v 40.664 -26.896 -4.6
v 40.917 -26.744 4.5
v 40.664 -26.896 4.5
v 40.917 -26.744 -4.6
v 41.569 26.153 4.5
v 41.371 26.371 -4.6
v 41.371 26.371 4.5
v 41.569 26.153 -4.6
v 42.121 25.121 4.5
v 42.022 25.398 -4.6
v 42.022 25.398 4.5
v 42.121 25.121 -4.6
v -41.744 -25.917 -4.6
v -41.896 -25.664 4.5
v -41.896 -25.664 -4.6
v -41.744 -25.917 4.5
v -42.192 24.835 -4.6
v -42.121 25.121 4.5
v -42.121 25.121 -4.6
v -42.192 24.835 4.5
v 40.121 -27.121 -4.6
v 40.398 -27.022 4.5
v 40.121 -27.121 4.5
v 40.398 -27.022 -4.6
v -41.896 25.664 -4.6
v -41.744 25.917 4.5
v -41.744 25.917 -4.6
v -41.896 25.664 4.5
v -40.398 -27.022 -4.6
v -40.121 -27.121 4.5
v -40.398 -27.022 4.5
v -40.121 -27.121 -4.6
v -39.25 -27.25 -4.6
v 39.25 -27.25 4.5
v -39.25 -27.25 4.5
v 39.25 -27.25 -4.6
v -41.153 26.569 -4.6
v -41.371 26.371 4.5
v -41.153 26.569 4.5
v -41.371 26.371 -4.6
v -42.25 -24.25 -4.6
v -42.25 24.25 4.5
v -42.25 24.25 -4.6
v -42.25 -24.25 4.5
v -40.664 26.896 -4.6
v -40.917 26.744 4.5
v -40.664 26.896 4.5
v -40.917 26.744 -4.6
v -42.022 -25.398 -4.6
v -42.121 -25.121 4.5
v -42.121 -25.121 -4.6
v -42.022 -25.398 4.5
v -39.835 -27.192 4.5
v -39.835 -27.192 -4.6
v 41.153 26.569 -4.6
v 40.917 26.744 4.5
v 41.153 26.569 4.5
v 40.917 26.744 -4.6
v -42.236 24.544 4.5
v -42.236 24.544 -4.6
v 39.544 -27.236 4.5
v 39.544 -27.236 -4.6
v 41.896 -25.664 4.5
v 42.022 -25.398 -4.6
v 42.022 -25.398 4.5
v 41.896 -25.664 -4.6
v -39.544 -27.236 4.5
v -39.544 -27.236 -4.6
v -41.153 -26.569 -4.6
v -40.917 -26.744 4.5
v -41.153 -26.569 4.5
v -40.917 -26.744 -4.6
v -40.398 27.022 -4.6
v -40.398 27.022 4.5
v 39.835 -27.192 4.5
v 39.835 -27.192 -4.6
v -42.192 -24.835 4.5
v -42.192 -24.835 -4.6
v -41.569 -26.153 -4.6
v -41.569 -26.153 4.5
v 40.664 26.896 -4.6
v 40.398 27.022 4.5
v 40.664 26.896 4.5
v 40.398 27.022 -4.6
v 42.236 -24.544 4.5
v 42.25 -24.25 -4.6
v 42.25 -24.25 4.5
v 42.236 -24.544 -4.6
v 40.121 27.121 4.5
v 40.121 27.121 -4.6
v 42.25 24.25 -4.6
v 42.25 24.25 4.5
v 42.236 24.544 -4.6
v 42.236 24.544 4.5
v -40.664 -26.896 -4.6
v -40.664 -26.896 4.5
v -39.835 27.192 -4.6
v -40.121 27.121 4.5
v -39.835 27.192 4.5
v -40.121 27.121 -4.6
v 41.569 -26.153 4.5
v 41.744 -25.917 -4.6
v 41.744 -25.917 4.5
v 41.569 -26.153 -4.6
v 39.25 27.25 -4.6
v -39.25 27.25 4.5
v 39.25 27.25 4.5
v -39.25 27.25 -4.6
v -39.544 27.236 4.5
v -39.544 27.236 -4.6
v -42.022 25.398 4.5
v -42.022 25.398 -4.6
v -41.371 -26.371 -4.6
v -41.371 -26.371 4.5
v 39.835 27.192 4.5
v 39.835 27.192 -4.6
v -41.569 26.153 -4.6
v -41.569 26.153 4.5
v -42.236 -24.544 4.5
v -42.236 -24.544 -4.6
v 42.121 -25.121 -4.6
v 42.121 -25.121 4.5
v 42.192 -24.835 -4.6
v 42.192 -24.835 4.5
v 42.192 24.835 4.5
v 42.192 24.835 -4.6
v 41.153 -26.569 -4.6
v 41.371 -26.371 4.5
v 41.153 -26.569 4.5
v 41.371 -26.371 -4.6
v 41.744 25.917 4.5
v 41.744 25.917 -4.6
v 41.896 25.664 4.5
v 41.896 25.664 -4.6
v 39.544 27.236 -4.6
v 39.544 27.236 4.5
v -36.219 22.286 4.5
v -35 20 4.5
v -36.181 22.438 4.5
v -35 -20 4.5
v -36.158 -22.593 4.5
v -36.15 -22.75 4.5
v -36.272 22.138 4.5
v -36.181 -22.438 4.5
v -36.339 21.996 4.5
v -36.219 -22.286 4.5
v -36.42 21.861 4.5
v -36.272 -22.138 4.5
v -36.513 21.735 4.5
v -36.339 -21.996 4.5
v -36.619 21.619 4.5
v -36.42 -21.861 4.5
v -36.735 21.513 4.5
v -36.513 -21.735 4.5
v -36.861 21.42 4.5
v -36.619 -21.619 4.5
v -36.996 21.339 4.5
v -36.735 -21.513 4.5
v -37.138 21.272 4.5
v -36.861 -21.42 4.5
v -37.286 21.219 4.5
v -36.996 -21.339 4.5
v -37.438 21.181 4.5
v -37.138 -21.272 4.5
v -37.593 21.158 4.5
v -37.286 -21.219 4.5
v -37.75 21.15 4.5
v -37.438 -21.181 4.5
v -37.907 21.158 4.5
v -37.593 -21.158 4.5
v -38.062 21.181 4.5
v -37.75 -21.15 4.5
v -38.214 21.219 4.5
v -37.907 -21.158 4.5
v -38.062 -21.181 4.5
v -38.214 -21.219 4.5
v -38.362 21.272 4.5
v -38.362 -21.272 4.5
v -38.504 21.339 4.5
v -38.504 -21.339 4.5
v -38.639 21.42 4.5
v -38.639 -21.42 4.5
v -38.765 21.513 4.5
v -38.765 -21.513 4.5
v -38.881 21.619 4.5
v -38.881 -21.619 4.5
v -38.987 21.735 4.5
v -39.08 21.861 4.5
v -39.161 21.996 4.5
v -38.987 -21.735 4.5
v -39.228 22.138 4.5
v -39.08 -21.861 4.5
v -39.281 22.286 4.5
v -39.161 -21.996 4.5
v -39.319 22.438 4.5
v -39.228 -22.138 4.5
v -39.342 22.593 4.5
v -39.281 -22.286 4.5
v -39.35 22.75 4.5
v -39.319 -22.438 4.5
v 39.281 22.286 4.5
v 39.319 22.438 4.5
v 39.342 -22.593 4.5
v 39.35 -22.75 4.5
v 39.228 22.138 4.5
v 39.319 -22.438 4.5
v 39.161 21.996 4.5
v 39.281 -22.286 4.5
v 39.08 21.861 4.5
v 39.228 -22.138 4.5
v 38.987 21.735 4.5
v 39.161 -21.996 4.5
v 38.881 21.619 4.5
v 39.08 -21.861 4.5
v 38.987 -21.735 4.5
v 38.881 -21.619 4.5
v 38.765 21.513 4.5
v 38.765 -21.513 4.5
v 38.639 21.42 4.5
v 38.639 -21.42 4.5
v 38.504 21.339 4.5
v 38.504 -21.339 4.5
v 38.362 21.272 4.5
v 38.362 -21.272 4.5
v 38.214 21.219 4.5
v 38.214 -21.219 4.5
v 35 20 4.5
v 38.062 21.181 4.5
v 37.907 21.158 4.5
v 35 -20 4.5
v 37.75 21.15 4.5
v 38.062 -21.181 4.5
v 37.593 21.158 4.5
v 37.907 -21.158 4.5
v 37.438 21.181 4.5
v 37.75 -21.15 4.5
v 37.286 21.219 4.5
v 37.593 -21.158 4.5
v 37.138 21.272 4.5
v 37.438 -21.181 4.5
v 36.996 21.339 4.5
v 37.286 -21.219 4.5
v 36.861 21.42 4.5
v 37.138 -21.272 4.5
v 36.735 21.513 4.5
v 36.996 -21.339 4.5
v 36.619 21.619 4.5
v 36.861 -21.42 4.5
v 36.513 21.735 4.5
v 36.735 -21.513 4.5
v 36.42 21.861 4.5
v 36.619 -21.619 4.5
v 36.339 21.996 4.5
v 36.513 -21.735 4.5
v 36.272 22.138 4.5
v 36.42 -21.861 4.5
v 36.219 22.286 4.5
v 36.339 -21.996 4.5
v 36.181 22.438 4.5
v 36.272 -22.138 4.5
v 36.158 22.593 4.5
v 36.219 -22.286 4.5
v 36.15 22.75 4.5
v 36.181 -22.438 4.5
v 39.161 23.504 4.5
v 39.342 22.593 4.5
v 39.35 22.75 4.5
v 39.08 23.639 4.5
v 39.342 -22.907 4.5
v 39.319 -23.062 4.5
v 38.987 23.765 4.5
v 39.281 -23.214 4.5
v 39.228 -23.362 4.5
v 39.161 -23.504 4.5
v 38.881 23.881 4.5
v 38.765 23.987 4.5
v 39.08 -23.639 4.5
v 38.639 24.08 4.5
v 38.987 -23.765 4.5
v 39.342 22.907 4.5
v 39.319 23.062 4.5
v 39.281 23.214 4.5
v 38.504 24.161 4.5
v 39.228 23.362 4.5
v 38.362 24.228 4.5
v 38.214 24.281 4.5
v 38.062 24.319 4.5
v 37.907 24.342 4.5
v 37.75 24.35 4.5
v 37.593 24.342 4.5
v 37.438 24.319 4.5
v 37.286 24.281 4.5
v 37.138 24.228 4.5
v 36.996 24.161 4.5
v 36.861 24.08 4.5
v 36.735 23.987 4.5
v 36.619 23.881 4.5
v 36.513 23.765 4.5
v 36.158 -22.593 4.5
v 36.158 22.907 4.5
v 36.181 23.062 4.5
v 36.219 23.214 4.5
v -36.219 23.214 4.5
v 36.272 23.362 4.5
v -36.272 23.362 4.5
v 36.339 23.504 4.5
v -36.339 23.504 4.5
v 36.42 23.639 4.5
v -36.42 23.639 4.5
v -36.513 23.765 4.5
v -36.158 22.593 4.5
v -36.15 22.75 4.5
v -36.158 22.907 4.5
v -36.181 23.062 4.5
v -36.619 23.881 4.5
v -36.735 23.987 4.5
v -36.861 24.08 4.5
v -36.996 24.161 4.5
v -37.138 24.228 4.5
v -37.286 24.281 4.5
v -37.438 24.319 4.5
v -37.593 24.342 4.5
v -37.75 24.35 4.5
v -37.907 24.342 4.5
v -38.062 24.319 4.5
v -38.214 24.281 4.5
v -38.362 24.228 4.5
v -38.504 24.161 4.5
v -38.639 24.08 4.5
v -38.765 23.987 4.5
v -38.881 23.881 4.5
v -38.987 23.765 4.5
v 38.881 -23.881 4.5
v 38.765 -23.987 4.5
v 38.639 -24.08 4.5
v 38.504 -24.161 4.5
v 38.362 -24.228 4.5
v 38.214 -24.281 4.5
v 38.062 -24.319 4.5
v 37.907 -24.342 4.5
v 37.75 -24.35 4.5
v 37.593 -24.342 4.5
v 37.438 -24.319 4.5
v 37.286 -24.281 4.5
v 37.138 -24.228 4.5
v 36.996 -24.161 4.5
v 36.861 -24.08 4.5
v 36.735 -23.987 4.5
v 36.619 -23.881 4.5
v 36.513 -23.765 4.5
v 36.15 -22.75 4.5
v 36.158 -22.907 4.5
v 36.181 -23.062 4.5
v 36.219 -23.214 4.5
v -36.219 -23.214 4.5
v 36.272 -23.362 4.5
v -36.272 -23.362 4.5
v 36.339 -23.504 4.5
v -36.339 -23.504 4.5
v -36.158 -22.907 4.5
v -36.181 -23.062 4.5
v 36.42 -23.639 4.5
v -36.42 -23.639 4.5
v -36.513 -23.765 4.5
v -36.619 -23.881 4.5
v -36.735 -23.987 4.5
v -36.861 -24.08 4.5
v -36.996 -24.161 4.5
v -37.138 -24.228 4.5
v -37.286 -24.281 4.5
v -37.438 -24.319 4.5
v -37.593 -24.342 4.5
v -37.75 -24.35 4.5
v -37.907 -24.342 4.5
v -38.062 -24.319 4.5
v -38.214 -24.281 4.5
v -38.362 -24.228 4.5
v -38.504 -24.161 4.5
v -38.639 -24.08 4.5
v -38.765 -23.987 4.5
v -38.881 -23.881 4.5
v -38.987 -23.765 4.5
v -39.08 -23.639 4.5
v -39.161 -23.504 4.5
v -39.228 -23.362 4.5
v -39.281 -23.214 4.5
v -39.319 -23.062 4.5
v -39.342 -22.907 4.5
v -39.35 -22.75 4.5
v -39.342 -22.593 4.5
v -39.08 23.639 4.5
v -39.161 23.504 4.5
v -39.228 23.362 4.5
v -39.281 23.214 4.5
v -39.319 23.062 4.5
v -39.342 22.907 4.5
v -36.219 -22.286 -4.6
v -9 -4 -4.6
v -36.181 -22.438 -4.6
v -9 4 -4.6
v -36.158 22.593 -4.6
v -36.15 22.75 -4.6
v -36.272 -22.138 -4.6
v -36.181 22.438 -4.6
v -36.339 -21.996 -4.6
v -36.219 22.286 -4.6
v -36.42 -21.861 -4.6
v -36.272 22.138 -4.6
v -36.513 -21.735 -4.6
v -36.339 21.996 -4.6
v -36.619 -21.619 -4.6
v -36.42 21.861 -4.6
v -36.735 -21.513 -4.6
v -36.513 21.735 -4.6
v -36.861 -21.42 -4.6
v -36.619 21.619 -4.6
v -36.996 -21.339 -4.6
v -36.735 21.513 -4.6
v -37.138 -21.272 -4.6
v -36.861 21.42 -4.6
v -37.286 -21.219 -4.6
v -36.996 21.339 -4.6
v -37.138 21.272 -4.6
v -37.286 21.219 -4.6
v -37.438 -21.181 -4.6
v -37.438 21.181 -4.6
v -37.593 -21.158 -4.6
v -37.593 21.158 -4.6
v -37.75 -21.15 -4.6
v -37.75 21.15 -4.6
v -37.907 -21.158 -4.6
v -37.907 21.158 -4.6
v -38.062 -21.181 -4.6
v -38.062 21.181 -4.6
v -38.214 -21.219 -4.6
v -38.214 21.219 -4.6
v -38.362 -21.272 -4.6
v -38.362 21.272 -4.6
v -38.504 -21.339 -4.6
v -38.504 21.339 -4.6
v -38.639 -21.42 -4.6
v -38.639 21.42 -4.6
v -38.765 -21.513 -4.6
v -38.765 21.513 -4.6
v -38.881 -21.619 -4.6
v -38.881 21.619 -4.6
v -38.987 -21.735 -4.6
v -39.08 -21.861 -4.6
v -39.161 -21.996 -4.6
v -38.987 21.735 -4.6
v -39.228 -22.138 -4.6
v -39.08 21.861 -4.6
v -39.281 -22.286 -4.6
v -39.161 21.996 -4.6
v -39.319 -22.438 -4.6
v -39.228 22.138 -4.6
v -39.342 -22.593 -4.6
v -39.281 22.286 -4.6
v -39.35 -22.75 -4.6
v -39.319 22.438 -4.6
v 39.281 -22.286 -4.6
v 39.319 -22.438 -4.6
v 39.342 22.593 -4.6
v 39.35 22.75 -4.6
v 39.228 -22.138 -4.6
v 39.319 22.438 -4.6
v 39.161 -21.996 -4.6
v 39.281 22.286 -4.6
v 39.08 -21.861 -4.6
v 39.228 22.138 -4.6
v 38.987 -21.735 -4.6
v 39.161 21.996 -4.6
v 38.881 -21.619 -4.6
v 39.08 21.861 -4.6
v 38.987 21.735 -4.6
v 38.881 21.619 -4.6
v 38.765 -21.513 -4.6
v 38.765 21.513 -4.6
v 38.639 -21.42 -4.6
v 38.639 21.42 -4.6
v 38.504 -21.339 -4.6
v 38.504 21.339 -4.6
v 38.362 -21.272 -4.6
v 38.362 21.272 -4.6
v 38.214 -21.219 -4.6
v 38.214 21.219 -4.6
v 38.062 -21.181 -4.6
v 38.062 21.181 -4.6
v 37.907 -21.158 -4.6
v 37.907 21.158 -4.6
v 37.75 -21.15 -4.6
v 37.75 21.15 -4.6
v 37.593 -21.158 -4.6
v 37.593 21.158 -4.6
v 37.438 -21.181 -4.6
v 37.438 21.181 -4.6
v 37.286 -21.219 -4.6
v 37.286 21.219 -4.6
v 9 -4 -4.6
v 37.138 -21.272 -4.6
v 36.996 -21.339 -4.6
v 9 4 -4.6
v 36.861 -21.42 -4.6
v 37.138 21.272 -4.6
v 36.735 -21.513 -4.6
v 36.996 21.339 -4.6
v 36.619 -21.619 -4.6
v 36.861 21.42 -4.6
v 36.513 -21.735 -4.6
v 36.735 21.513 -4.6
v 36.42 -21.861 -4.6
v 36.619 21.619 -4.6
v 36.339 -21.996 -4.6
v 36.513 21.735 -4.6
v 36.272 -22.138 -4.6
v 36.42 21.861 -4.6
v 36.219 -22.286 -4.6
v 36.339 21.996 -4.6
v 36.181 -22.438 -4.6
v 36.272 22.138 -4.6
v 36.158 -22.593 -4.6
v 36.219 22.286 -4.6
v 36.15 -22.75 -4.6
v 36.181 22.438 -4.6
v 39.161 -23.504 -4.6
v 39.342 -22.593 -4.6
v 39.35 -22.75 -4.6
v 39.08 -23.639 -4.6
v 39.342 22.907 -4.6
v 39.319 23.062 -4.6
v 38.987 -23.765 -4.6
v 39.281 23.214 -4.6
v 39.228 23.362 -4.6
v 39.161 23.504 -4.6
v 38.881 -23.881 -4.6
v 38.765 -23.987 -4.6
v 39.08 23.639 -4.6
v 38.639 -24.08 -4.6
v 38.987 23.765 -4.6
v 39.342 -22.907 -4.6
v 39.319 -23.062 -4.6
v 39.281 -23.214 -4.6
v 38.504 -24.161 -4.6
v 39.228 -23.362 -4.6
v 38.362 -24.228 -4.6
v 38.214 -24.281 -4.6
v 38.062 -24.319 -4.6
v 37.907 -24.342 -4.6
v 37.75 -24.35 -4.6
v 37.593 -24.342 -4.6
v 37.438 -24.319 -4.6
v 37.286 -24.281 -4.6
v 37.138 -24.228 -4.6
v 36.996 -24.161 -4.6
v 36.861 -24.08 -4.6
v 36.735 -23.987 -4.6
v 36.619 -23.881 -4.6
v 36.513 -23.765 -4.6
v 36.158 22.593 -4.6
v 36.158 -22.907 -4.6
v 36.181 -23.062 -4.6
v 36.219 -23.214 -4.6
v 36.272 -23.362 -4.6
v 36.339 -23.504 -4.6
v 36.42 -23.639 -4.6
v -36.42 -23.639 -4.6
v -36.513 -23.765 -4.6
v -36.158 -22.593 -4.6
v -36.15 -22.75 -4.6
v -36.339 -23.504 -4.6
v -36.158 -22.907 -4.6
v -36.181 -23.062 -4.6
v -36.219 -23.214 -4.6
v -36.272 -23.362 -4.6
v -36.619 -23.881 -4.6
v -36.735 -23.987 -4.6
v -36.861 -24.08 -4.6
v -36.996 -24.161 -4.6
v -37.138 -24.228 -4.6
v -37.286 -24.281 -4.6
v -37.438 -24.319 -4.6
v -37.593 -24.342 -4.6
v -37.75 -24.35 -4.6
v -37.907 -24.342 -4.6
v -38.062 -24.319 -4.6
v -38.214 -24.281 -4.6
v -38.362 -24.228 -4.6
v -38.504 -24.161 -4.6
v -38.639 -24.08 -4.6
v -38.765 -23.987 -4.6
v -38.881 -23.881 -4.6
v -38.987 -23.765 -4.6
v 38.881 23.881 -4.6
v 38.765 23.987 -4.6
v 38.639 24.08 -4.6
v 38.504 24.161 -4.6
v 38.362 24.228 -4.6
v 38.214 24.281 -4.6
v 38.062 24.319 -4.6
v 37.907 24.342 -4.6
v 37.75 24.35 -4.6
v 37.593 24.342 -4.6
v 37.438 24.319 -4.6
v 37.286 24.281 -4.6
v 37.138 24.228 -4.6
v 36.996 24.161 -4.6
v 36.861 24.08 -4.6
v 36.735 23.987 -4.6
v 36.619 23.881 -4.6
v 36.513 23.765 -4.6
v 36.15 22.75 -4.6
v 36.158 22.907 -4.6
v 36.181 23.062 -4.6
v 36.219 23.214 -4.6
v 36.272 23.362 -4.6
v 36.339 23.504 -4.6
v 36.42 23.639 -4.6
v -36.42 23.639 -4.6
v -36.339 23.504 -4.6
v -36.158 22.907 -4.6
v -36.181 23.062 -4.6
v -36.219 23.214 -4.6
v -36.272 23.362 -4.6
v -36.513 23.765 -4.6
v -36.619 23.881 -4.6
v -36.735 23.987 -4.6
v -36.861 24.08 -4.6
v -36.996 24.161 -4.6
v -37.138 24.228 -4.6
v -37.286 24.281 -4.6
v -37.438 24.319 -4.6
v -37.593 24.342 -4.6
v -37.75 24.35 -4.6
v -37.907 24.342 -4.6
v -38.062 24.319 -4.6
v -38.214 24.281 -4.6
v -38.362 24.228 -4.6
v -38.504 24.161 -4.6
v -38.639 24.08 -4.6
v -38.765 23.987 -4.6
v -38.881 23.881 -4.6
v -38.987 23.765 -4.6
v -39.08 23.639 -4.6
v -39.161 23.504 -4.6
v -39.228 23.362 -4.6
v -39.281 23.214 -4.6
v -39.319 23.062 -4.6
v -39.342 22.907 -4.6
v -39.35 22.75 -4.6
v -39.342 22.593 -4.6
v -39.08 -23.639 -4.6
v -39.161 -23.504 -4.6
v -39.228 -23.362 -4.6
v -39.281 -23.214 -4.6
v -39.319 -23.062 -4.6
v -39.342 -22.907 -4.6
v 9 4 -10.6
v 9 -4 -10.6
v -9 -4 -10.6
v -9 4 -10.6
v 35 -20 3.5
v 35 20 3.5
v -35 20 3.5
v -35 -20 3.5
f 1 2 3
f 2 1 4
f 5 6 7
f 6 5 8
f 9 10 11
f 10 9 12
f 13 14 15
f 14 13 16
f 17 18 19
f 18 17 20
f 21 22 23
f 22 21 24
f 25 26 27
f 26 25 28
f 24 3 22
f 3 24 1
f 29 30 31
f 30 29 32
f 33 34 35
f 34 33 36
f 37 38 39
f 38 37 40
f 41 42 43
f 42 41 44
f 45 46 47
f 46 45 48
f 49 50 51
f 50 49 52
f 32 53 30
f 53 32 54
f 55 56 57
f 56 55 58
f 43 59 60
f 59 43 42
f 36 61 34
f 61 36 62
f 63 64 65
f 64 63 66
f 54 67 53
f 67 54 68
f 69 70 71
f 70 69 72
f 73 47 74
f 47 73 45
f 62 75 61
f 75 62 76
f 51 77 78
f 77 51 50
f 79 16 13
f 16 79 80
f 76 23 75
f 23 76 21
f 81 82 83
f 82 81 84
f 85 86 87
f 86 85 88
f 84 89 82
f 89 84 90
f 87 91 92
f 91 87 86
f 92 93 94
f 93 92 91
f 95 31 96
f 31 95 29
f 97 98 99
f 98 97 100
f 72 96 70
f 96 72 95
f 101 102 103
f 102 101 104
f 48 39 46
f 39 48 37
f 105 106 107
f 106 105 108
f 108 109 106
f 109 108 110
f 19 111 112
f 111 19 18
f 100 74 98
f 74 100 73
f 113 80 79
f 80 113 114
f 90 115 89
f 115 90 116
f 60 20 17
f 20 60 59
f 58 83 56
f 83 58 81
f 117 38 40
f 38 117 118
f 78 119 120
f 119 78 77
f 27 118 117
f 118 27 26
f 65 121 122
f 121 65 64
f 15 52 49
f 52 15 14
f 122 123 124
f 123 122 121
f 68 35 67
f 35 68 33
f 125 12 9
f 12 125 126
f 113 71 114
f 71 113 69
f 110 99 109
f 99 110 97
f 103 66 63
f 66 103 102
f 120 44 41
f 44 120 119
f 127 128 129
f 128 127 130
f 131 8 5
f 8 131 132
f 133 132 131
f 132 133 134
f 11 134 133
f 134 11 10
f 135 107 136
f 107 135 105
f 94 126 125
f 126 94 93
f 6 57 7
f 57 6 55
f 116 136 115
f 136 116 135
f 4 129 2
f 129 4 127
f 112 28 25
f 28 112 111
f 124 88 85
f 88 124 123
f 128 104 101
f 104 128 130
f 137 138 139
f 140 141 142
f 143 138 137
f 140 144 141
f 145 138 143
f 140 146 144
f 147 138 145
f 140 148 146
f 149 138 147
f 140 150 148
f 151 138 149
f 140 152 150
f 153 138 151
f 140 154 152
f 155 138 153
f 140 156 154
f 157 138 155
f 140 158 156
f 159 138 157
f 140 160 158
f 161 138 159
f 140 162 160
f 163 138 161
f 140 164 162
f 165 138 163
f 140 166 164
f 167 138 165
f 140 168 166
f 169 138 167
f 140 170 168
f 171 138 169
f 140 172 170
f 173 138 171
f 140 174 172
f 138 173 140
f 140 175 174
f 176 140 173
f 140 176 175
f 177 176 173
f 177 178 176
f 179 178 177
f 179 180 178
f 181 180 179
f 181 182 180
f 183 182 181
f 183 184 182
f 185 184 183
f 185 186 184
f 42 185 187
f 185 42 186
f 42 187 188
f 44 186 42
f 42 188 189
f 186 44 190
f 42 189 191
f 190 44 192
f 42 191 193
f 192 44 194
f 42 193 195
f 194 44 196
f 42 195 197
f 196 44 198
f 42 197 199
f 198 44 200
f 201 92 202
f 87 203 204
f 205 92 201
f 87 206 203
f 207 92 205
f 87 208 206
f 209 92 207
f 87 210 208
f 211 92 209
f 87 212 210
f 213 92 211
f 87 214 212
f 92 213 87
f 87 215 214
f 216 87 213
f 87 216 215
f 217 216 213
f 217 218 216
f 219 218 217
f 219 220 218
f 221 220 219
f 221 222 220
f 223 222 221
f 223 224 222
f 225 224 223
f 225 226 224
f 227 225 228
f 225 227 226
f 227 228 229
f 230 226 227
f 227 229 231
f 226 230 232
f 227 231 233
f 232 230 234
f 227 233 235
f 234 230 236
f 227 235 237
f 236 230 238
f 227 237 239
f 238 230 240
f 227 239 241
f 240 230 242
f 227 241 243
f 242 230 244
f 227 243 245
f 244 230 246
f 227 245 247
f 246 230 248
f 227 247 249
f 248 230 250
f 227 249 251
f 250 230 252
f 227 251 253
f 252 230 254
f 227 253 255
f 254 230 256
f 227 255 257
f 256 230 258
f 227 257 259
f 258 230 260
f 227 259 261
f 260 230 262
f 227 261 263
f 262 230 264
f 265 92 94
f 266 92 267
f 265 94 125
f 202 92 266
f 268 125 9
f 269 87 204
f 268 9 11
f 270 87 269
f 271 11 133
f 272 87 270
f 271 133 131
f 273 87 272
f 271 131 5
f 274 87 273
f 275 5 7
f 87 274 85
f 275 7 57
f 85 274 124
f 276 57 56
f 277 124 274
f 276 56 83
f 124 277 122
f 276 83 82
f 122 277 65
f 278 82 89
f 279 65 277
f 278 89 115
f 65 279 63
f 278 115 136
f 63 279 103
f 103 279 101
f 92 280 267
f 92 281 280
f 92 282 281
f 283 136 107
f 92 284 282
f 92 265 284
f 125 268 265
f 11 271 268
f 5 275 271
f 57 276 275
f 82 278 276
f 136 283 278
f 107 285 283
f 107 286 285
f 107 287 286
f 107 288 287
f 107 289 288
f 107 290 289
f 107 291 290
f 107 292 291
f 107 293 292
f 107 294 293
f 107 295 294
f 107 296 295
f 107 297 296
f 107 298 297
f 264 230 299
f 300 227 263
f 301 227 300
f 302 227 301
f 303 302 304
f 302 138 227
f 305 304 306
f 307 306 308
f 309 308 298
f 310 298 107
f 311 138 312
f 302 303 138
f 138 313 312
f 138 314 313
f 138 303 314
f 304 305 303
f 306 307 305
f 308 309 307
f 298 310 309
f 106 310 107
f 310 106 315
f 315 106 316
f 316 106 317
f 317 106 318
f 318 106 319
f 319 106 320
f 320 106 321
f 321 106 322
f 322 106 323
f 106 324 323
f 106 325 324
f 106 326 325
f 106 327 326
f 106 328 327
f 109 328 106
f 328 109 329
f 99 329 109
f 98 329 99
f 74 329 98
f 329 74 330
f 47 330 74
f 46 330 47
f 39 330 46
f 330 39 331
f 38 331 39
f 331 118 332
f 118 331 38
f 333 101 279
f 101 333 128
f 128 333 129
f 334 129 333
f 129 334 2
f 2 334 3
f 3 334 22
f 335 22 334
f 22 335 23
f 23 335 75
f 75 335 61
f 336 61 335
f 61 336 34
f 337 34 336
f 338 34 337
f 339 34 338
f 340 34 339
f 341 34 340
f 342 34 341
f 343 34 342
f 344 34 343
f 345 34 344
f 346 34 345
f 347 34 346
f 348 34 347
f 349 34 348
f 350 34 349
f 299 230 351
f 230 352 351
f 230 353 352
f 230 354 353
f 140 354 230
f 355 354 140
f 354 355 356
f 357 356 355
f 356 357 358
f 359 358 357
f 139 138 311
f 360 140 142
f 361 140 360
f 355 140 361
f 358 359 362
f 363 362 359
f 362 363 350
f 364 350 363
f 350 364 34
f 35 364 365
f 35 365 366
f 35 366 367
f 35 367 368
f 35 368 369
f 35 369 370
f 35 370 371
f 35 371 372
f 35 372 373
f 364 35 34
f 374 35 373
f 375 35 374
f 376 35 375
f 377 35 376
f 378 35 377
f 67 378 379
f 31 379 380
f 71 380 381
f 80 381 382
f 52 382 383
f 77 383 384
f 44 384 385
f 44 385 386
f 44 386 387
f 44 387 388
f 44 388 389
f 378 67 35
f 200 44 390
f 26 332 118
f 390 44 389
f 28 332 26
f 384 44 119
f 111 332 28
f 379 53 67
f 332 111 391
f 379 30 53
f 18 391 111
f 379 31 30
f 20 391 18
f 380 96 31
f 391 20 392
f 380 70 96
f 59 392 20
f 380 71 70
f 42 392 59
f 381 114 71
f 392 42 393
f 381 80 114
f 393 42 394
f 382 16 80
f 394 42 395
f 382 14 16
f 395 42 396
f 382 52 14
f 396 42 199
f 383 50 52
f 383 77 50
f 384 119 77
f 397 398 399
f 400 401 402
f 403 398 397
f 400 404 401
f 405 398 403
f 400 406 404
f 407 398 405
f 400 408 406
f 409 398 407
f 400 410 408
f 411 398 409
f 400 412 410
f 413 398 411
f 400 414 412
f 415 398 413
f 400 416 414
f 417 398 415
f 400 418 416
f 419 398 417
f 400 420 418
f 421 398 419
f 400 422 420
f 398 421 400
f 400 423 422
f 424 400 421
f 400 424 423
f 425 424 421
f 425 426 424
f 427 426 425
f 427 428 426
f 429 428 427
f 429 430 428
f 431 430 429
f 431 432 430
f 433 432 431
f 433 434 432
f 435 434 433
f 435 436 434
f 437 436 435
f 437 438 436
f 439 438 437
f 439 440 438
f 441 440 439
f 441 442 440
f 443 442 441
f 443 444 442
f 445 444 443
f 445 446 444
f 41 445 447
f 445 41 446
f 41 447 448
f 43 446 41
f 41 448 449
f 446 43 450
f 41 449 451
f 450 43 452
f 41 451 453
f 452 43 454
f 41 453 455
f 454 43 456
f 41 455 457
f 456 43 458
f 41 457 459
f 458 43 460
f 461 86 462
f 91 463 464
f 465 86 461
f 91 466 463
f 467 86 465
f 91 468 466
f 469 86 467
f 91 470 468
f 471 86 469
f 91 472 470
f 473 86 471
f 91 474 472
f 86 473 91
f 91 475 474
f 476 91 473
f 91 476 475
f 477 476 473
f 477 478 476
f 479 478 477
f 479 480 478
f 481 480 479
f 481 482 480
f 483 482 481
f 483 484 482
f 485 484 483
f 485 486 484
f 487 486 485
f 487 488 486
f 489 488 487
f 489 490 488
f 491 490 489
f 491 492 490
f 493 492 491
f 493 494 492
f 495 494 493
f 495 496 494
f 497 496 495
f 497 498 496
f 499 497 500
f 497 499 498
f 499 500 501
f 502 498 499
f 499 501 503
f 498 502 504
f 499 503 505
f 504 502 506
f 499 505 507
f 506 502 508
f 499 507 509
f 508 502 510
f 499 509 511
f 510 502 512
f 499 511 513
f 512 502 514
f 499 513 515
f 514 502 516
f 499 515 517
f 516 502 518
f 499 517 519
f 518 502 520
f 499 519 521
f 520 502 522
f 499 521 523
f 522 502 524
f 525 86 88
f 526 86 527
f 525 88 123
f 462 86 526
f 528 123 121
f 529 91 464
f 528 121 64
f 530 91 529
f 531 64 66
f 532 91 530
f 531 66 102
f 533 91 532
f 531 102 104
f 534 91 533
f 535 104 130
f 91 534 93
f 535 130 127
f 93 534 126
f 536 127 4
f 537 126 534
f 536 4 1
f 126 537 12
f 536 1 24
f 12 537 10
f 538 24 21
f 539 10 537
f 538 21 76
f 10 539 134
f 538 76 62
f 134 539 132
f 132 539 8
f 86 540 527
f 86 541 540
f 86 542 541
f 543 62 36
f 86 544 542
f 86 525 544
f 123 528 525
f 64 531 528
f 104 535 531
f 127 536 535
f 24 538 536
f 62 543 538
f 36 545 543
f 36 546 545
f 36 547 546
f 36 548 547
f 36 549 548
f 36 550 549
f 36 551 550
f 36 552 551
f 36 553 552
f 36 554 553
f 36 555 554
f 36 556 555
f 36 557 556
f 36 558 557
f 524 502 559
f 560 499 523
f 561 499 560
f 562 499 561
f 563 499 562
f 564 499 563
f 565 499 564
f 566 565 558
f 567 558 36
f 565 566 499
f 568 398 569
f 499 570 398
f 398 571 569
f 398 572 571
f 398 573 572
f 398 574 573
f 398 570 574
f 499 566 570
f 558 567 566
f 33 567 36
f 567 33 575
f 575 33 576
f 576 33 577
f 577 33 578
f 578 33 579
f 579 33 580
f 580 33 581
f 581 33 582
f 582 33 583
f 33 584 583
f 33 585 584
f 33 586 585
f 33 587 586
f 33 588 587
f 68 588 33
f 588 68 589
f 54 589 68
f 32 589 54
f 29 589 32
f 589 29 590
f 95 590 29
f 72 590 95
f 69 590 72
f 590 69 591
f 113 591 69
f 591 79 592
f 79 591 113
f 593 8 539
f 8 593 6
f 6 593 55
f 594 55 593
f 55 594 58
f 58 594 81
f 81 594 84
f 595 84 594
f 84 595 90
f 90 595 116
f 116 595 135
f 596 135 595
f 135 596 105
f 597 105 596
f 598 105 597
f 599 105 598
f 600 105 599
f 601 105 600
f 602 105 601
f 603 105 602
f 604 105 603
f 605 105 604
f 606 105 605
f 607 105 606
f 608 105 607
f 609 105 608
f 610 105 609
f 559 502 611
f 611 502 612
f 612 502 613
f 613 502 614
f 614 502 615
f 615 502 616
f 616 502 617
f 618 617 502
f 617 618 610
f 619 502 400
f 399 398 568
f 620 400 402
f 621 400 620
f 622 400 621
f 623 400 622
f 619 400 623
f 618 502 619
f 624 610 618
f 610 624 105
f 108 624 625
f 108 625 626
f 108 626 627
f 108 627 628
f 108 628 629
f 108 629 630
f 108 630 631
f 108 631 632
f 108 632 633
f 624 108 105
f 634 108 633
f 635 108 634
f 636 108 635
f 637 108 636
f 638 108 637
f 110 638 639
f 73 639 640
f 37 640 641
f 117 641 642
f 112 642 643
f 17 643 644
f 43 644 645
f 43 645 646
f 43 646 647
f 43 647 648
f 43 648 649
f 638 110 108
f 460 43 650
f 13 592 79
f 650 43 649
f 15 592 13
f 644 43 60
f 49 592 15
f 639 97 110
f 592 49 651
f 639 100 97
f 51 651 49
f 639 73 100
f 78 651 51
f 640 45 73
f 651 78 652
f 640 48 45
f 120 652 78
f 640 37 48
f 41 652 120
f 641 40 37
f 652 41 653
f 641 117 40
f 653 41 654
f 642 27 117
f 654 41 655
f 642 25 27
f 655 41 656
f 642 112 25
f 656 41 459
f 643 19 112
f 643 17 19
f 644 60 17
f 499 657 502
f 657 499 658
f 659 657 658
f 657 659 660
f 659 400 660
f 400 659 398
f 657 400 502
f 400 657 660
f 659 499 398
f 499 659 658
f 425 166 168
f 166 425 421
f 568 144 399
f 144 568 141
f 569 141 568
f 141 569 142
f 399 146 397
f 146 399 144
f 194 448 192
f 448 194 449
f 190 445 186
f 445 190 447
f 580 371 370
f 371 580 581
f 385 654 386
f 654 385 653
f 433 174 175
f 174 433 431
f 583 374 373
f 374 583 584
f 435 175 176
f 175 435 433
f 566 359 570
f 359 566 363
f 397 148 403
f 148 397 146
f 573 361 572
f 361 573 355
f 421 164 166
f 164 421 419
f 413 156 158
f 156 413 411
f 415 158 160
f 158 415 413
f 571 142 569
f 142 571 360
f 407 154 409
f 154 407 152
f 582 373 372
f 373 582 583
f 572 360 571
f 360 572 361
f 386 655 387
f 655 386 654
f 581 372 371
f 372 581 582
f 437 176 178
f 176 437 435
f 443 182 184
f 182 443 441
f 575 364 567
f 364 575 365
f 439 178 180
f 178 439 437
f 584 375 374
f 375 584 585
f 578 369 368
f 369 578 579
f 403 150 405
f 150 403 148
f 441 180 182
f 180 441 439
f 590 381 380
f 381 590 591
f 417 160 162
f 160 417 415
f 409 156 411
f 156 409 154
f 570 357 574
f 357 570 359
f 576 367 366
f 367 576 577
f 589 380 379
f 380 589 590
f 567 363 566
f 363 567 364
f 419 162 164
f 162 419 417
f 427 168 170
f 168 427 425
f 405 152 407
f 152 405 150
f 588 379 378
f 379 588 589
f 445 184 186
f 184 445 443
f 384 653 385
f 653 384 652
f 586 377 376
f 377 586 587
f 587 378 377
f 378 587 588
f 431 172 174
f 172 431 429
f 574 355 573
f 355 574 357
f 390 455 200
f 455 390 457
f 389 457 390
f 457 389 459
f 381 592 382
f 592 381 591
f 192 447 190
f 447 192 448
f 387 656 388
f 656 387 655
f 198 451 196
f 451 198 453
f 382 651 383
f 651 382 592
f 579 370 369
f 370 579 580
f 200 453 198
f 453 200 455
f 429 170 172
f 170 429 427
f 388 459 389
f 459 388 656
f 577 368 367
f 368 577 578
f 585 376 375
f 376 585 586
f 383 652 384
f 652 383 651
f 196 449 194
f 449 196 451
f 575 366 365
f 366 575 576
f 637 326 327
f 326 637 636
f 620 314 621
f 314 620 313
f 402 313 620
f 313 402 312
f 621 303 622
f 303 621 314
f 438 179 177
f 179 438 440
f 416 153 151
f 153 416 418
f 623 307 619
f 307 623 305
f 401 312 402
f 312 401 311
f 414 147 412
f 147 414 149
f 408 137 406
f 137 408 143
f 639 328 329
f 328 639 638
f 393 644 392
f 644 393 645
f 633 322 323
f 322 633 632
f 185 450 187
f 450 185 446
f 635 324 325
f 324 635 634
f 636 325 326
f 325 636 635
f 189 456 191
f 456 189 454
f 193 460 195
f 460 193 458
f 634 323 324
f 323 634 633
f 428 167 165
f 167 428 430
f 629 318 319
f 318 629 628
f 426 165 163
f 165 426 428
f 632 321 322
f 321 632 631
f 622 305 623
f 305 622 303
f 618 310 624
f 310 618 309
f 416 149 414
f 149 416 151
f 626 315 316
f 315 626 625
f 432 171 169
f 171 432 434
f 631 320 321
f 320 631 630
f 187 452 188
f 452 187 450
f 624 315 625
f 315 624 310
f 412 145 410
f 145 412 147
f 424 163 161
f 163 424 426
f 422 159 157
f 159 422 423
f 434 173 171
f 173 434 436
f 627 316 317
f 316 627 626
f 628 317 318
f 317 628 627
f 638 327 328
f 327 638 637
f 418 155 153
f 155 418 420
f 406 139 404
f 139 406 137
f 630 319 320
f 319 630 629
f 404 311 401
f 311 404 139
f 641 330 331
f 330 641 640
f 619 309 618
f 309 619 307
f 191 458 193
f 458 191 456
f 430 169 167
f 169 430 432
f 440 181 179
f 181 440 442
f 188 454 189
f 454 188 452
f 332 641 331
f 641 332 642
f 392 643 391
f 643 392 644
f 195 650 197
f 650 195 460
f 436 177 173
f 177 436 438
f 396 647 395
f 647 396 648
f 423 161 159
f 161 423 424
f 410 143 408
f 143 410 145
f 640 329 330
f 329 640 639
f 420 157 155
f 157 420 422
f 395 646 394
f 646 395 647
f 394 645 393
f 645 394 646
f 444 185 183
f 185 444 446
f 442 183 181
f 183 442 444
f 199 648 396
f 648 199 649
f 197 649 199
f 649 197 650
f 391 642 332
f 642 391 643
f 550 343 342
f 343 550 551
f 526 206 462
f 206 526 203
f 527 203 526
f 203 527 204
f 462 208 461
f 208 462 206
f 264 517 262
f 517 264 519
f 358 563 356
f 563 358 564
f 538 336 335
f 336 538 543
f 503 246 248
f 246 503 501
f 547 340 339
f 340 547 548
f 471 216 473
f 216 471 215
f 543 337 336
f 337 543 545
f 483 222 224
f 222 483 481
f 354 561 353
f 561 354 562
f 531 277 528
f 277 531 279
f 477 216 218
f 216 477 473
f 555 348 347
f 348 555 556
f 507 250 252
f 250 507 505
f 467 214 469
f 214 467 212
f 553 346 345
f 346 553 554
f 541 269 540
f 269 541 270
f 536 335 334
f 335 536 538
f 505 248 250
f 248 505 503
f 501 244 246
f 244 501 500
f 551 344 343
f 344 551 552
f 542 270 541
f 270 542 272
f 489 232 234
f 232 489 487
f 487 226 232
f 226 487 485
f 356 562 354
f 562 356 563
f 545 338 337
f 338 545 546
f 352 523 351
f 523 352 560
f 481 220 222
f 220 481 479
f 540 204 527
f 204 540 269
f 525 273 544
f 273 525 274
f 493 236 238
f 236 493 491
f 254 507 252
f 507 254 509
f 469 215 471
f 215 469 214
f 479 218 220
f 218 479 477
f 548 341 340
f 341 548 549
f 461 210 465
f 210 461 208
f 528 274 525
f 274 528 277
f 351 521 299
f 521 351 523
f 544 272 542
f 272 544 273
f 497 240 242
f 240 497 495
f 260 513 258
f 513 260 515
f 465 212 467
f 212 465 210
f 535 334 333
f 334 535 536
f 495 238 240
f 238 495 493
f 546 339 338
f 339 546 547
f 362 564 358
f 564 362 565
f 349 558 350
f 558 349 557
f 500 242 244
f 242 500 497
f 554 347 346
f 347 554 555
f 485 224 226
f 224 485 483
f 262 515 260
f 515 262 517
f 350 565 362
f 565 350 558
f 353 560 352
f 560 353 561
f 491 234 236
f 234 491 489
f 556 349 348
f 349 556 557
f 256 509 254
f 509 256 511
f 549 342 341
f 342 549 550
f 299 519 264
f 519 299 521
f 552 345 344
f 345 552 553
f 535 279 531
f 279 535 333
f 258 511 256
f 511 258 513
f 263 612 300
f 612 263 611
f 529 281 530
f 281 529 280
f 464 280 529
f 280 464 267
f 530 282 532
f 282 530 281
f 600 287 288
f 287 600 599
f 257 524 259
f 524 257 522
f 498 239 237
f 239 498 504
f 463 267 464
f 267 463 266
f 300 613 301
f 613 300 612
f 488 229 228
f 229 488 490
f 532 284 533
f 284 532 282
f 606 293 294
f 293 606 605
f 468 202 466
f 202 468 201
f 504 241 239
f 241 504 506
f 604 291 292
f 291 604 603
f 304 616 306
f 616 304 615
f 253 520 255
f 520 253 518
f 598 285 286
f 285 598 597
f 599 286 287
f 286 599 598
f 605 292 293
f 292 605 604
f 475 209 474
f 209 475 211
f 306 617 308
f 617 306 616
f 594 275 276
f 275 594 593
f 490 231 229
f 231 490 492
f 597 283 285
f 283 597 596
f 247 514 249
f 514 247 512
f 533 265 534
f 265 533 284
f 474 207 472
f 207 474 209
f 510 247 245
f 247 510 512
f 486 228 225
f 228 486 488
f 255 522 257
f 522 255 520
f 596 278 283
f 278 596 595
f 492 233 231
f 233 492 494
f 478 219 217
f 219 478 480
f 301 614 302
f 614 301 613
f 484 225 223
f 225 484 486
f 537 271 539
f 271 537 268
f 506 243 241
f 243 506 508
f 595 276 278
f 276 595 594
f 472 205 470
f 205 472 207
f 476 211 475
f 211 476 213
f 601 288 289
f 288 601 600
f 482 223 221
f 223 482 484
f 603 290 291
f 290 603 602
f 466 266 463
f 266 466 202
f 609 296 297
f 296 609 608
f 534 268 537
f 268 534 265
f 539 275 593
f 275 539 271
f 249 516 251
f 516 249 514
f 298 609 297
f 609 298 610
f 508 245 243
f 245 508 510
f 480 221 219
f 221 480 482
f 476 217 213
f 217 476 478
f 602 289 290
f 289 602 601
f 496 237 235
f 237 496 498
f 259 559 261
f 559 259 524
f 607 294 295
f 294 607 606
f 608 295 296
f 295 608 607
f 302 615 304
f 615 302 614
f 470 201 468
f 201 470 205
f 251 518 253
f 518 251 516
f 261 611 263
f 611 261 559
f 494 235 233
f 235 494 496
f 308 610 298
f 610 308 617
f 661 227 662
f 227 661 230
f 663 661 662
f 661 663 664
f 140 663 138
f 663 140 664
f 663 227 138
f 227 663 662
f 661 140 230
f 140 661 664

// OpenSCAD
$fn = 64;

// Parameters
width_mm = 84.5; //[42.25:169:0.1]
height_mm = 54.5; //[27.25:109:0.1]
thickness_mm = 8; //[4:16:0.1]
corner_radius_mm = 3; //[1.5:6:0.1]
front_face_thickness_mm = 1.5; //[0.75:3:0.1]
pcb_thickness_mm = 1.6; //[0.8:3.2:0.1]
aperture_width_mm = 70; //[35:80:0.1]
aperture_height_mm = 40; //[20:50:0.1]
aperture_depth_mm = 2; //[1:6:0.1]
display_thickness_mm = 3; //[1.5:6:0.1]
mount_hole_diameter_mm = 3.2; //[1.6:6.4:0.1]
mount_hole_edge_margin_mm = 4.5; //[2.25:9:0.1]
connector_clearance_mm = 6; //[3:12:0.1]
connector_width_mm = 18; //[9:36:0.1]
connector_height_mm = 8; //[4:16:0.1]
overlap_mm = 1; //[0.5:2:0.1]

// Rounded rectangle prism (centered)
module rounded_box(size=[10,10,2], r=1, center=true) {
  x = size[0]; y = size[1]; z = size[2];
  rr = min(r, x/2, y/2);
  translate(center ? [0,0,0] : [x/2,y/2,z/2])
    linear_extrude(height=z, center=true)
      offset(rr)
        square([x-2*rr, y-2*rr], center=true);
}

// Display block (solid, connected)
module display_block() {
  // Place display behind the front face, inside the aperture pocket, with overlap into body
  z_disp = (thickness_mm/2 + front_face_thickness_mm) - aperture_depth_mm - display_thickness_mm/2 + overlap_mm;
  translate([0, 0, z_disp])
    cube([aperture_width_mm - 2*overlap_mm, aperture_height_mm - 2*overlap_mm, display_thickness_mm], center=true);
}

// Back connector bump (solid, connected)
module connector_bump() {
  // Attach to the back of the PCB plate with overlap
  z_bump = (-thickness_mm/2 - pcb_thickness_mm) - connector_clearance_mm/2 + overlap_mm;
  translate([0, 0, z_bump])
    cube([connector_width_mm, connector_height_mm, connector_clearance_mm], center=true);
}

// Main assembly (ONE connected solid)
module assembly() {

  // Z extents for through-holes (ensure they cut everything)
  total_z = thickness_mm + front_face_thickness_mm + pcb_thickness_mm + connector_clearance_mm + 4*overlap_mm;

  difference() {
    union() {
      // Main body with rounded corners (exact overall XY: 84.5 x 54.5)
      color([0.85, 0.85, 0.8])
        rounded_box([width_mm, height_mm, thickness_mm], r=corner_radius_mm, center=true);

      // Front face plate (overlaps into body to guarantee connectivity)
      z_front = thickness_mm/2 + front_face_thickness_mm/2 - overlap_mm;
      color([0.1, 0.1, 0.6])
        translate([0, 0, z_front])
          rounded_box([width_mm, height_mm, front_face_thickness_mm], r=corner_radius_mm, center=true);

      // Rear PCB plate (overlaps into body to guarantee connectivity)
      z_pcb = -thickness_mm/2 - pcb_thickness_mm/2 + overlap_mm;
      color([0.1, 0.1, 0.6])
        translate([0, 0, z_pcb])
          rounded_box([width_mm, height_mm, pcb_thickness_mm], r=corner_radius_mm, center=true);

      // Display block (connected)
      color([0.72, 0.42, 0.12])
        display_block();

      // Back connector bump (connected)
      color([0.2, 0.2, 0.2])
        connector_bump();
    }

    // Display aperture pocket (cuts into front face/body)
    z_ap = (thickness_mm/2 + front_face_thickness_mm) - aperture_depth_mm/2 + overlap_mm;
    translate([0, 0, z_ap])
      cube([aperture_width_mm, aperture_height_mm, aperture_depth_mm + 2*overlap_mm], center=true);

    // Mounting holes (through everything)
    for (x = [-1, 1], y = [-1, 1]) {
      translate([x * (width_mm/2 - mount_hole_edge_margin_mm),
                 y * (height_mm/2 - mount_hole_edge_margin_mm),
                 0])
        cylinder(h=total_z, r=mount_hole_diameter_mm/2, center=true);
    }
  }
}

assembly();
